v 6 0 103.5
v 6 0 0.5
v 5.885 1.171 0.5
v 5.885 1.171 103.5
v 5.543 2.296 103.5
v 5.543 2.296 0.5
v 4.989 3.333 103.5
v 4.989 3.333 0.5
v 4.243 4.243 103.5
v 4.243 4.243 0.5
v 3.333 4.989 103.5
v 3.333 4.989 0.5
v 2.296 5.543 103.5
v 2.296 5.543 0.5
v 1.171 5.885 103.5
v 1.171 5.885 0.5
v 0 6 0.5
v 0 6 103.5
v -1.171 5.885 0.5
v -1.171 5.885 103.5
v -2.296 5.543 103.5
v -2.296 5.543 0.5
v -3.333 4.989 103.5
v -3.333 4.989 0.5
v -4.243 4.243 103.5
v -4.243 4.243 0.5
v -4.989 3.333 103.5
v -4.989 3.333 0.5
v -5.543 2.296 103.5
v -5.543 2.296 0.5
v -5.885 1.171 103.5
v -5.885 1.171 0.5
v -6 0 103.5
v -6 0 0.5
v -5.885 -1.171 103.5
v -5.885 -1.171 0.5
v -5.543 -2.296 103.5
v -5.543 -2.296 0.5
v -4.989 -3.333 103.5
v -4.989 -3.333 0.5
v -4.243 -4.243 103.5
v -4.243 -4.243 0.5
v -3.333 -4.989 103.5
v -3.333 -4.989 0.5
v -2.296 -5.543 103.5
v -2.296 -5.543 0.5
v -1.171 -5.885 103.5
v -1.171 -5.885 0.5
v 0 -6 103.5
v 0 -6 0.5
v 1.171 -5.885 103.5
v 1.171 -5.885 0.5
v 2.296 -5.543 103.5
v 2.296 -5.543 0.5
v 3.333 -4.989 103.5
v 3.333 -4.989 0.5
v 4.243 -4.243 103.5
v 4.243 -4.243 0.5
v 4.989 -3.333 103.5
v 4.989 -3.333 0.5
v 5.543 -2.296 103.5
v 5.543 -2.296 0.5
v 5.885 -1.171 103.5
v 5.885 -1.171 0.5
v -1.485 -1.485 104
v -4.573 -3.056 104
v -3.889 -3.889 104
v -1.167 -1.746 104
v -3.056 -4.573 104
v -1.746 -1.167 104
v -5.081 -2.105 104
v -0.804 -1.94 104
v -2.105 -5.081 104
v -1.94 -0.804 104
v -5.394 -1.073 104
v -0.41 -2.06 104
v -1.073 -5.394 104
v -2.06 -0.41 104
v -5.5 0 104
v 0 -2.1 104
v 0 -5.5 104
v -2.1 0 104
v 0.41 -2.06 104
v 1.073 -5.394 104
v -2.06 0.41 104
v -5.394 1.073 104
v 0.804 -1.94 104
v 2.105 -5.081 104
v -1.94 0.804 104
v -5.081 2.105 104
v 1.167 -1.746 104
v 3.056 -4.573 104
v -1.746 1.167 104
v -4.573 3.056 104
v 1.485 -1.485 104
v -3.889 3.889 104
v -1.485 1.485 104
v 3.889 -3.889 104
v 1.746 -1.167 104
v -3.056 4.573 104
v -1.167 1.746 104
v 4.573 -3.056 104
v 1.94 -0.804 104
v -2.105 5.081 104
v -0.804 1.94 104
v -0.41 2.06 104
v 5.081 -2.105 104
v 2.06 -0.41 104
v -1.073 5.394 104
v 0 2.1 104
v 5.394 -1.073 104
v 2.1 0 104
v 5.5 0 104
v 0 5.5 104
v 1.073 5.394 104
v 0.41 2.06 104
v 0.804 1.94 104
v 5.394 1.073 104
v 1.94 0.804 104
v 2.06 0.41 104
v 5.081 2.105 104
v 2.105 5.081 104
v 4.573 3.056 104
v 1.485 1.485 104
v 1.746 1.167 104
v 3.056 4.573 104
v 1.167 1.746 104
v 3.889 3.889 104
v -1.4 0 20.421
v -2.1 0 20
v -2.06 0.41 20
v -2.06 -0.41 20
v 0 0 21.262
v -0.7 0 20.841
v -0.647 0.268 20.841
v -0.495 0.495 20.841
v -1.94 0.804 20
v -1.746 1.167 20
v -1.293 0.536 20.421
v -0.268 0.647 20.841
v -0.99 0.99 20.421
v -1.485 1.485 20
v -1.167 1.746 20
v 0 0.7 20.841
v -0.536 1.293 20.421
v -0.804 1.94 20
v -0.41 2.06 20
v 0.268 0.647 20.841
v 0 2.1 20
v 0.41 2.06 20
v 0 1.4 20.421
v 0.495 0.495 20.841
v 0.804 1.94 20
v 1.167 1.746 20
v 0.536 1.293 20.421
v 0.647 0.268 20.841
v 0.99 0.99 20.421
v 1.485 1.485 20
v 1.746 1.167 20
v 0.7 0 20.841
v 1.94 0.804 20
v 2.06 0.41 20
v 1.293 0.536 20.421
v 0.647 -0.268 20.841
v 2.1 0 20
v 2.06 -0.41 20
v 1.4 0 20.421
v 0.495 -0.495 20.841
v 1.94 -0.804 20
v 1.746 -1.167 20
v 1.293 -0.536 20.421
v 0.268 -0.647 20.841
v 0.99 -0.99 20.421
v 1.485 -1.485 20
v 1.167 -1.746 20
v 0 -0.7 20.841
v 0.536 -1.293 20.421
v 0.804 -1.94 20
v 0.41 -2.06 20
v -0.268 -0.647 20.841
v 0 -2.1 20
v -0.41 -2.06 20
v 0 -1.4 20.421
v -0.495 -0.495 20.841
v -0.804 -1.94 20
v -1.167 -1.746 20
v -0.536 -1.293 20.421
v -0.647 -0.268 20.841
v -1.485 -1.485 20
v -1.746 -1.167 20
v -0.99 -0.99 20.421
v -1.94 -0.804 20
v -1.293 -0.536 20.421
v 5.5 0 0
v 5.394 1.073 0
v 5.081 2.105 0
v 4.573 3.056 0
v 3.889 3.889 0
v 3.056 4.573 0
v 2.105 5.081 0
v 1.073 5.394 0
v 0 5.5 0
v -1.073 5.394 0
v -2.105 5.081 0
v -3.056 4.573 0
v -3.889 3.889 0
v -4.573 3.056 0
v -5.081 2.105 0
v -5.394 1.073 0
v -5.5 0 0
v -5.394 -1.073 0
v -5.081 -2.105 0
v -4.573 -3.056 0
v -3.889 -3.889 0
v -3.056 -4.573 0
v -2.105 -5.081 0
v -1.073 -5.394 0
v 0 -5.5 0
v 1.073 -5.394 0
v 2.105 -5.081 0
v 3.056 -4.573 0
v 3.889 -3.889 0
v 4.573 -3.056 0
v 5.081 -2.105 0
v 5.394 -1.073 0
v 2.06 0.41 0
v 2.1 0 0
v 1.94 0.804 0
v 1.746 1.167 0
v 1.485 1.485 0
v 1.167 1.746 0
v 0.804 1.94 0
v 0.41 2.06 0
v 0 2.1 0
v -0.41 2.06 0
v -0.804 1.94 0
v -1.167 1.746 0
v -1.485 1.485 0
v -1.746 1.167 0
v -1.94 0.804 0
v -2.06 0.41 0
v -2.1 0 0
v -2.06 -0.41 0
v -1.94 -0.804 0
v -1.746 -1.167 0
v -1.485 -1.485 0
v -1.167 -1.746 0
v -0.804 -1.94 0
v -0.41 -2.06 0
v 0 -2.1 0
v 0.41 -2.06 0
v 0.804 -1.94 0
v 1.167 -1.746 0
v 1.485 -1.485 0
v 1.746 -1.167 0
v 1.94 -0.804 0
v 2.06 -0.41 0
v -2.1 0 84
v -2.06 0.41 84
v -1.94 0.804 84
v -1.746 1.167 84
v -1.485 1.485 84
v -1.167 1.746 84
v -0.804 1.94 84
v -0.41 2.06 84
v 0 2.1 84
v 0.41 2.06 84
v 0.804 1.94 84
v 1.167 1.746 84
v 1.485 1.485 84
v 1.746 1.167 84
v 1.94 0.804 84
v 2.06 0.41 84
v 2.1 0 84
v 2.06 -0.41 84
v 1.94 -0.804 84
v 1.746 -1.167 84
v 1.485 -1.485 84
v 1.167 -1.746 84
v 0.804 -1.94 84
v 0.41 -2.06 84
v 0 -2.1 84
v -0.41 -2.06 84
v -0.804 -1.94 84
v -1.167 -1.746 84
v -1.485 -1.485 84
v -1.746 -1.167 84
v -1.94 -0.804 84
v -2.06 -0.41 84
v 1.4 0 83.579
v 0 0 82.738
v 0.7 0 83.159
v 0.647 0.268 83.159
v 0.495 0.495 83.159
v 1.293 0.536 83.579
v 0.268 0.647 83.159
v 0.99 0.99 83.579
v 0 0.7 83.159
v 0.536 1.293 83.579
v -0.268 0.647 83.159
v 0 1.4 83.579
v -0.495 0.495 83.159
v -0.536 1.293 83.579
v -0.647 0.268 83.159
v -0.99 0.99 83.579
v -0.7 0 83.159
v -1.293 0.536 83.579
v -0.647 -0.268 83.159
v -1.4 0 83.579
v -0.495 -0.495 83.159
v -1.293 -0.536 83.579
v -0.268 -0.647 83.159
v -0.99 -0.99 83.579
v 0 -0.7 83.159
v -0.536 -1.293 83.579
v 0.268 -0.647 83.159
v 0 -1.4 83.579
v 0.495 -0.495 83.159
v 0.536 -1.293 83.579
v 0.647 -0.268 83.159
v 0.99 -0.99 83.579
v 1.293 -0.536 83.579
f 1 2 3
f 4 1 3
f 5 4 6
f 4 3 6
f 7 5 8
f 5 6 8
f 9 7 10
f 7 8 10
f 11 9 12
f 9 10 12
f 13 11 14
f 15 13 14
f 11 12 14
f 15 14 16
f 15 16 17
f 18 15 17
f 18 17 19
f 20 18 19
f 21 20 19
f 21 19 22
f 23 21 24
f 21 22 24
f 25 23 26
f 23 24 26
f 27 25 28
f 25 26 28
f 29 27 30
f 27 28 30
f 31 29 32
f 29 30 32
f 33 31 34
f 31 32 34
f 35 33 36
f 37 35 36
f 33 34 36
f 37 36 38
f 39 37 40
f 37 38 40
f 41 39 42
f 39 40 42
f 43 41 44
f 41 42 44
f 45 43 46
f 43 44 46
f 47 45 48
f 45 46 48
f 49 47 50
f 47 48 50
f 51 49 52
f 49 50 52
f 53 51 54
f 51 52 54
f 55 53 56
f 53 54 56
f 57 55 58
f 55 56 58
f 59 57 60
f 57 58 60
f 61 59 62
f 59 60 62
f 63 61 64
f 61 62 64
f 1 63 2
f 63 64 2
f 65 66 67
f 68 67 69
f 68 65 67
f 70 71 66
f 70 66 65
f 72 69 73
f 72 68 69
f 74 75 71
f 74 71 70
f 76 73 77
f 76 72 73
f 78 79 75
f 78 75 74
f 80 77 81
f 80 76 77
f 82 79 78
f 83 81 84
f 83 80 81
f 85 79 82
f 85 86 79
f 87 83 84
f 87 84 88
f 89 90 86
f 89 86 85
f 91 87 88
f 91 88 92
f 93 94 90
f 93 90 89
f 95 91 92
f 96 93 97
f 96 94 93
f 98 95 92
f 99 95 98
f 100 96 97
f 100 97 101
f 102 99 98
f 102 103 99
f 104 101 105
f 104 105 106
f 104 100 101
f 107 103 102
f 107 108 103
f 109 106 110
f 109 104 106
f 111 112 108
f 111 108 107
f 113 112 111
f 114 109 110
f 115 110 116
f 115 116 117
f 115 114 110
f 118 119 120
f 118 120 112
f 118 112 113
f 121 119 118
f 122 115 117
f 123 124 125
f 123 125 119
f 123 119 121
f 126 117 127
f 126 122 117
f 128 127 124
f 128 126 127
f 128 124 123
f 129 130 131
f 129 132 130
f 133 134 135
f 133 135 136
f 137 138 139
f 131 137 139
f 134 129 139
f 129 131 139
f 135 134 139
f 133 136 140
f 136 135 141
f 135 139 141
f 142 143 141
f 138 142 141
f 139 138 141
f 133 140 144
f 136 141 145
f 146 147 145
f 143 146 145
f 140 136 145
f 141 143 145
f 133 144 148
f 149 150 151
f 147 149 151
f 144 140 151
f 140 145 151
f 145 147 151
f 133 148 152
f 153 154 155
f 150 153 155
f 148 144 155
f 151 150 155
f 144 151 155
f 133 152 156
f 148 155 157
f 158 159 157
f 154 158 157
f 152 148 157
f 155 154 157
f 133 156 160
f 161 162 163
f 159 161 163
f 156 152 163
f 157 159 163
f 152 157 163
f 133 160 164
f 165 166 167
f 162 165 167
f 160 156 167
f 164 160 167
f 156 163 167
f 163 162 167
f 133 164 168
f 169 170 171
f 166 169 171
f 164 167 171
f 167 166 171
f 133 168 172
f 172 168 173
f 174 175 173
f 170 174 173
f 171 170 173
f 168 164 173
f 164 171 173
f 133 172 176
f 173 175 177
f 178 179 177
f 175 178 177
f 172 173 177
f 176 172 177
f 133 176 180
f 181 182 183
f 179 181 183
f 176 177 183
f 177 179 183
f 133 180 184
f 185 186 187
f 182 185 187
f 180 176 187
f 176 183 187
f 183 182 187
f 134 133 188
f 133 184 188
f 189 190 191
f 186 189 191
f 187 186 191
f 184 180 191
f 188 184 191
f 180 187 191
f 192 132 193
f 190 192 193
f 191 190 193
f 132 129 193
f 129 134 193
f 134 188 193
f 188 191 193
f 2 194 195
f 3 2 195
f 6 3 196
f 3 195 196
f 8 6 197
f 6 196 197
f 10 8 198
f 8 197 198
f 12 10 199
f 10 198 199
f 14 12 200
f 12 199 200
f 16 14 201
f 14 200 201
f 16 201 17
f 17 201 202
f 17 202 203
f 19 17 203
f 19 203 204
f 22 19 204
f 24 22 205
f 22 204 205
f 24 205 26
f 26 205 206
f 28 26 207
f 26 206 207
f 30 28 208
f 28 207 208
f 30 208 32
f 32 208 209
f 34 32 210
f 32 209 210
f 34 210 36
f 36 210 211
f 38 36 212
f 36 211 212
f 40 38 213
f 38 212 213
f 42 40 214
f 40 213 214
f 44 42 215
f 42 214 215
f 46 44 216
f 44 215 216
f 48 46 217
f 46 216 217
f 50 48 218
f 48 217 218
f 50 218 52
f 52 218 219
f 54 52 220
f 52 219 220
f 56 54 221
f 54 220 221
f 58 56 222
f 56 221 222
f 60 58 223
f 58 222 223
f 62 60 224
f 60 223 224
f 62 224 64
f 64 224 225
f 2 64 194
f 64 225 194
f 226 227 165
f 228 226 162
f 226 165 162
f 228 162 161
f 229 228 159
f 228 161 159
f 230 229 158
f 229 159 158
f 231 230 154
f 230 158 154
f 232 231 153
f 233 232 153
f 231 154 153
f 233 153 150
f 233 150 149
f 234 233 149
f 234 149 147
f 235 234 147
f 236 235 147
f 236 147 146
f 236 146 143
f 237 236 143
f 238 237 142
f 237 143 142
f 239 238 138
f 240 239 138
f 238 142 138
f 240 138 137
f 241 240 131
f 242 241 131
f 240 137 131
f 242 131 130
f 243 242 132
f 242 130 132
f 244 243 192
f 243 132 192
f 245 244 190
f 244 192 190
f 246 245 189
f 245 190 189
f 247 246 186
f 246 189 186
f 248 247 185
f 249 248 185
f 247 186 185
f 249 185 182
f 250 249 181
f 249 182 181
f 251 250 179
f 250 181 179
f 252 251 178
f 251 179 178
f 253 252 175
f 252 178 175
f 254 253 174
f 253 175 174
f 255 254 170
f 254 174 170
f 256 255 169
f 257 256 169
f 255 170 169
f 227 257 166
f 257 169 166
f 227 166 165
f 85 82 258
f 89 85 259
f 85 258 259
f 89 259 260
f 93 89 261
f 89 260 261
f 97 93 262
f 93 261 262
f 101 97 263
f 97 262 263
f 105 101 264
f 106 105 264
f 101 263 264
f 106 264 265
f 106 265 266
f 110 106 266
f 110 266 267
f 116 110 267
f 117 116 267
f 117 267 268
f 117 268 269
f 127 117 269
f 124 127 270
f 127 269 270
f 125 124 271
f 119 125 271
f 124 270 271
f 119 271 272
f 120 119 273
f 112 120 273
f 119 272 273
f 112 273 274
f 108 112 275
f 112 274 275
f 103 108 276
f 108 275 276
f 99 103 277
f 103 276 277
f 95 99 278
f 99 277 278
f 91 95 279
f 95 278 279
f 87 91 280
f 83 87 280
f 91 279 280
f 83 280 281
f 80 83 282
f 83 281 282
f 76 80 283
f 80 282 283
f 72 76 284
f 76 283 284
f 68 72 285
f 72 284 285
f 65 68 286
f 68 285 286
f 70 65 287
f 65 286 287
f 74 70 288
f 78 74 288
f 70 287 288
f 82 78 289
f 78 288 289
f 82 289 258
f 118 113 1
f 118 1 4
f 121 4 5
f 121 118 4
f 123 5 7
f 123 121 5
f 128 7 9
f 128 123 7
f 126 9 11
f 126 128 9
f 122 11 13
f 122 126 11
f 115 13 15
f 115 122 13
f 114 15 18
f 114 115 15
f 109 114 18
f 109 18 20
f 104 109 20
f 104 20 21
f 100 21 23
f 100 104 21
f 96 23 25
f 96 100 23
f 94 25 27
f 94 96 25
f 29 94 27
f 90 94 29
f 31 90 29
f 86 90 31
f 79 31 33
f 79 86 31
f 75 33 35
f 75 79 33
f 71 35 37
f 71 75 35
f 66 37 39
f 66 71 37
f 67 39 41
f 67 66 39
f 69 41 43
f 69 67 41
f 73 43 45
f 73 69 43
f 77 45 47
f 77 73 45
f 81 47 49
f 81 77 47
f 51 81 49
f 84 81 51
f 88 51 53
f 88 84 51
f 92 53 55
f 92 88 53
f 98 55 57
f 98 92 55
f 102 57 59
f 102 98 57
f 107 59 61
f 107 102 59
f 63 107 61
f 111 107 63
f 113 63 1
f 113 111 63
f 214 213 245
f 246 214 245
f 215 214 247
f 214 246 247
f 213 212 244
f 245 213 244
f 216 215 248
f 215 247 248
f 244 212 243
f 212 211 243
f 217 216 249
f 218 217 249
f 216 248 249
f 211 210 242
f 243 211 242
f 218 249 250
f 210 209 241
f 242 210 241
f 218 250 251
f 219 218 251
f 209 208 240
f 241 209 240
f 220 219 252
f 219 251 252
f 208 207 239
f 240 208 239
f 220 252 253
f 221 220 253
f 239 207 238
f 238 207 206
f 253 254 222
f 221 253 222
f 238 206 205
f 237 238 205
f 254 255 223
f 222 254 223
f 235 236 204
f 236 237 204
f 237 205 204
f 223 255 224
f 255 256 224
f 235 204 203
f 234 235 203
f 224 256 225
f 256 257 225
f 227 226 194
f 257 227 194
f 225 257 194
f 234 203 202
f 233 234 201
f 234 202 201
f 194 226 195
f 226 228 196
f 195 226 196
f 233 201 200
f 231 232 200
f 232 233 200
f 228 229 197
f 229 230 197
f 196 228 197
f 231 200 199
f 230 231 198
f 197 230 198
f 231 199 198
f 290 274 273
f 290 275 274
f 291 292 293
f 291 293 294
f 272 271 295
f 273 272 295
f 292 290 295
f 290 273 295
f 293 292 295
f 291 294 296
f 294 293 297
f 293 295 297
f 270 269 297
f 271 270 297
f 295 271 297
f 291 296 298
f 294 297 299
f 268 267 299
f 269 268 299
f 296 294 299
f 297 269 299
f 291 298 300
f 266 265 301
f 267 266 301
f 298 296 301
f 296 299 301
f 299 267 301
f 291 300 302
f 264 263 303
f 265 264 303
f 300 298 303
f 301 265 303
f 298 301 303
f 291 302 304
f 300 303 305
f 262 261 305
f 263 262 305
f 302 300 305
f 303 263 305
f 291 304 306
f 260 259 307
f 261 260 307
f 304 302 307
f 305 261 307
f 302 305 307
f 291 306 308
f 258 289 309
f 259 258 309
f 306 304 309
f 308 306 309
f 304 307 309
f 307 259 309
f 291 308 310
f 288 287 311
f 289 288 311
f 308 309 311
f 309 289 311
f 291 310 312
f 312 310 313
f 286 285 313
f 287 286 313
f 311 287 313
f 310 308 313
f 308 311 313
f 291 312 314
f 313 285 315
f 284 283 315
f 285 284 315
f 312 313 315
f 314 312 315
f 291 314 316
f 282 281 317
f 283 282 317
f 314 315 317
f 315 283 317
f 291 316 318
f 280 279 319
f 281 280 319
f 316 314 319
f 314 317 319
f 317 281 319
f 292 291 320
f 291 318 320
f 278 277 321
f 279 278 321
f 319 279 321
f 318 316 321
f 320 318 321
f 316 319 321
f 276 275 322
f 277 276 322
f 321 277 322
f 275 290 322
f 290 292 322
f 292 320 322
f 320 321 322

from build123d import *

# Parameters (mm, degrees)
ESQUISSE1_R               = 6
BOSS_EXTRU_1_DEPTH        = 104
TROU_TARAUD_M5X0_81_D     = 4.2
TROU_TARAUD_M5X0_81_DEPTH = 20
TROU_TARAUD_M5X0_81_TIP   = 1.2618073
TROU_TARAUD_M5X0_82_D     = 4.2
TROU_TARAUD_M5X0_82_DEPTH = 20
TROU_TARAUD_M5X0_82_TIP   = 1.2618073
CHANFREIN1_SIZE           = 0.5


with BuildPart() as part:
    # Esquisse1 → Boss.-Extru.1 (new body)
    with BuildSketch(Plane.XY):
        Circle(ESQUISSE1_R)
    extrude(amount=BOSS_EXTRU_1_DEPTH)

    # Trou taraudé M5x0.81
    with Locations(Plane(origin=(0, 0, 0), x_dir=(-1, 0, 0), z_dir=(0, 0, -1))):
        with Locations((0, 0)):
            Hole(TROU_TARAUD_M5X0_81_D / 2, depth=TROU_TARAUD_M5X0_81_DEPTH)
            with Locations((0, 0, -(TROU_TARAUD_M5X0_81_DEPTH + TROU_TARAUD_M5X0_81_TIP / 2))):  # 118° drill point
                Cone(0, TROU_TARAUD_M5X0_81_D / 2, TROU_TARAUD_M5X0_81_TIP, mode=Mode.SUBTRACT)

    # Trou taraudé M5x0.82
    with Locations(Plane.XY.offset(104)):
        with Locations((0, 0)):
            Hole(TROU_TARAUD_M5X0_82_D / 2, depth=TROU_TARAUD_M5X0_82_DEPTH)
            with Locations((0, 0, -(TROU_TARAUD_M5X0_82_DEPTH + TROU_TARAUD_M5X0_82_TIP / 2))):  # 118° drill point
                Cone(0, TROU_TARAUD_M5X0_82_D / 2, TROU_TARAUD_M5X0_82_TIP, mode=Mode.SUBTRACT)

    # Chanfrein1
    chanfrein1_edges = [part.edges().sort_by_distance(p)[0] for p in [
        (-6, 0, 0),
        (-6, 0, 104),
    ]]
    chamfer(chanfrein1_edges, length=CHANFREIN1_SIZE)


solid = part.part
